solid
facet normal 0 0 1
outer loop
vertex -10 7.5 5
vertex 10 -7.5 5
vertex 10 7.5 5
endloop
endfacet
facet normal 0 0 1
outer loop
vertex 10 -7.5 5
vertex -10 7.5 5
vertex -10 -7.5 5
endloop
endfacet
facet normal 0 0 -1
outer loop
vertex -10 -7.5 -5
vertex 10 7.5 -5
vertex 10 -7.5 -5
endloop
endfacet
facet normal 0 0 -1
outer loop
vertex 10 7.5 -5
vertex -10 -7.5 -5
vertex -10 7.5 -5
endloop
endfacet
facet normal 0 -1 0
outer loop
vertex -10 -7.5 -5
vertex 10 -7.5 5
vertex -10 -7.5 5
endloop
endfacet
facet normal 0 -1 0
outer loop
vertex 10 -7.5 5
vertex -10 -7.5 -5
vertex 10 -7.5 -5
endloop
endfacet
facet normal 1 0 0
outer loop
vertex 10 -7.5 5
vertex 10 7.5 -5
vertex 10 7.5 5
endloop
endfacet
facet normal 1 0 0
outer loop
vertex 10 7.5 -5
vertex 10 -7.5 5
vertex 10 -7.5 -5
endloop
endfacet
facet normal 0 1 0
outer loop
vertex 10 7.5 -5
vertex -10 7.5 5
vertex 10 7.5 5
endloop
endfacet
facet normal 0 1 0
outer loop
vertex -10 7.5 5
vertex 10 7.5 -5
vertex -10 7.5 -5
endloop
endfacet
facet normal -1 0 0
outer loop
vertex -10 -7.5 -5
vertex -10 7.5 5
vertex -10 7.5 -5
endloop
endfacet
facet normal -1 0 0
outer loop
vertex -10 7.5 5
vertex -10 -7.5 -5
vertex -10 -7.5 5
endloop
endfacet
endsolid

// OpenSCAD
// Parameters
width = 20;
depth = 15;
height = 10;
$fn = 50;

// Model
cube([width, depth, height], center=true);
